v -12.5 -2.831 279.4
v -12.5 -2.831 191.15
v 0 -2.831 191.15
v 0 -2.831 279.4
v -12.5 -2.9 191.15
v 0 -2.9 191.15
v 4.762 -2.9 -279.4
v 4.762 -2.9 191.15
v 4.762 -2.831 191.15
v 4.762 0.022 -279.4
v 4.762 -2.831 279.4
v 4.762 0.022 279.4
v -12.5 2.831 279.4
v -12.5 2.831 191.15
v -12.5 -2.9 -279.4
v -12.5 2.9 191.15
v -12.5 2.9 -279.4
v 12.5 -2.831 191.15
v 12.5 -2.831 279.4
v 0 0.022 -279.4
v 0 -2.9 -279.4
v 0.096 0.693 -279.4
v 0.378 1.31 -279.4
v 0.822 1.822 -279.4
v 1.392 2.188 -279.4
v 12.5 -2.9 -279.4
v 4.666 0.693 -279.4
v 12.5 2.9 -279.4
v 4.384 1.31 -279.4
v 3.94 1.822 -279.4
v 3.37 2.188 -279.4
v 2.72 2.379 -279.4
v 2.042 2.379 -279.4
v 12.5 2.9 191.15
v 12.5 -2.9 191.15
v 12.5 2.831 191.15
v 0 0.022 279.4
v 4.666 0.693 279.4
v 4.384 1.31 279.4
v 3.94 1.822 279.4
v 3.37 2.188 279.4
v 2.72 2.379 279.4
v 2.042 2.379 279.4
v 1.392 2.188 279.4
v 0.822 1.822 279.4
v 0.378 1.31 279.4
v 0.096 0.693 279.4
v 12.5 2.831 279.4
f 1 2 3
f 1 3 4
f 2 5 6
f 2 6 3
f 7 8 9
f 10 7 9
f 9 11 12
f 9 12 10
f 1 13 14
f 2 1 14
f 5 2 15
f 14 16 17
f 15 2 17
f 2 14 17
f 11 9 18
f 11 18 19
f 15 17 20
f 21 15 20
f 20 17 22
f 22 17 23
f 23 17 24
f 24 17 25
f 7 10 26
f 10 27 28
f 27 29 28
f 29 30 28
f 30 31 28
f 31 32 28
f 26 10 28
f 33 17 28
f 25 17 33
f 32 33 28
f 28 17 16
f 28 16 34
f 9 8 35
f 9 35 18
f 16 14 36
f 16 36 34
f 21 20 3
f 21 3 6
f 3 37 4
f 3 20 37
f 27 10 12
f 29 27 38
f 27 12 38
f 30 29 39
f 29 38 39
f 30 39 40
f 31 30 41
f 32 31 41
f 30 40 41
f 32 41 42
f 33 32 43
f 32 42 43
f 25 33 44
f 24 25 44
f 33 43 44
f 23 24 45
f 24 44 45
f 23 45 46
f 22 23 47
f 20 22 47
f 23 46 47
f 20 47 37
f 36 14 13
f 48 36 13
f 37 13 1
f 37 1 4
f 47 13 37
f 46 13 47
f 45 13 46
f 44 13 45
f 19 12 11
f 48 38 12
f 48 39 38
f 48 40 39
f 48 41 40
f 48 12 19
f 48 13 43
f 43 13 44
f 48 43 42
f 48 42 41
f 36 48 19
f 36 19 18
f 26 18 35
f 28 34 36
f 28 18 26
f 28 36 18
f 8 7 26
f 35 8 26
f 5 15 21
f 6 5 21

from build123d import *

# Parameters (mm, degrees)
SKETCH1_W           = 25
SKETCH1_H           = 5.8
EXTRUDE1_DEPTH      = 259.4
SKETCH6_W           = 25
SKETCH6_H           = 20
BOSS_EXTRUDE2_DEPTH = 5.8
CUT_EXTRUDE2_DEPTH  = 559.8
SKETCH8_W           = 88.25
SKETCH8_H           = 0.06858
CUT_EXTRUDE3_DEPTH  = 26


with BuildPart() as part:
    # Sketch1 → Extrude1 (new body, symmetric)
    with BuildSketch(Plane.XY):
        Rectangle(SKETCH1_W, SKETCH1_H)
    extrude(amount=EXTRUDE1_DEPTH, both=True)

    # Sketch6 → Boss-Extrude2 (add)
    with BuildSketch(Plane(origin=(0, 2.9, 0), x_dir=(1, 0, 0), z_dir=(0, 1, 0))):
        with Locations((0, 269.4)):
            Rectangle(SKETCH6_W, SKETCH6_H)
        with Locations((0, -269.4)):
            Rectangle(SKETCH6_W, SKETCH6_H)
    extrude(amount=-BOSS_EXTRUDE2_DEPTH)

    # Sketch7 → Cut-Extrude2 (cut, through all)
    with BuildSketch(Plane.XY.offset(279.4)):
        with BuildLine():
            Line((-0.00025, 0.0222), (-0.00025, -2.9))
            Line((-0.00025, -2.9), (4.76225, -2.9))
            Line((4.76225, -2.9), (4.76225, 0.0222))
            ThreePointArc((4.76225, 0.0222), (2.381, 2.40345), (-0.00025, 0.0222))
        make_face()
    extrude(amount=-CUT_EXTRUDE2_DEPTH, mode=Mode.SUBTRACT)

    # Sketch8 → Cut-Extrude3 (cut, through all)
    with BuildSketch(Plane.ZY.offset(12.5)):
        with Locations((235.275, 2.86571)):
            Rectangle(SKETCH8_W, SKETCH8_H)
        with Locations((235.275, -2.86571)):
            Rectangle(SKETCH8_W, SKETCH8_H)
    extrude(amount=-CUT_EXTRUDE3_DEPTH, mode=Mode.SUBTRACT)


solid = part.part
